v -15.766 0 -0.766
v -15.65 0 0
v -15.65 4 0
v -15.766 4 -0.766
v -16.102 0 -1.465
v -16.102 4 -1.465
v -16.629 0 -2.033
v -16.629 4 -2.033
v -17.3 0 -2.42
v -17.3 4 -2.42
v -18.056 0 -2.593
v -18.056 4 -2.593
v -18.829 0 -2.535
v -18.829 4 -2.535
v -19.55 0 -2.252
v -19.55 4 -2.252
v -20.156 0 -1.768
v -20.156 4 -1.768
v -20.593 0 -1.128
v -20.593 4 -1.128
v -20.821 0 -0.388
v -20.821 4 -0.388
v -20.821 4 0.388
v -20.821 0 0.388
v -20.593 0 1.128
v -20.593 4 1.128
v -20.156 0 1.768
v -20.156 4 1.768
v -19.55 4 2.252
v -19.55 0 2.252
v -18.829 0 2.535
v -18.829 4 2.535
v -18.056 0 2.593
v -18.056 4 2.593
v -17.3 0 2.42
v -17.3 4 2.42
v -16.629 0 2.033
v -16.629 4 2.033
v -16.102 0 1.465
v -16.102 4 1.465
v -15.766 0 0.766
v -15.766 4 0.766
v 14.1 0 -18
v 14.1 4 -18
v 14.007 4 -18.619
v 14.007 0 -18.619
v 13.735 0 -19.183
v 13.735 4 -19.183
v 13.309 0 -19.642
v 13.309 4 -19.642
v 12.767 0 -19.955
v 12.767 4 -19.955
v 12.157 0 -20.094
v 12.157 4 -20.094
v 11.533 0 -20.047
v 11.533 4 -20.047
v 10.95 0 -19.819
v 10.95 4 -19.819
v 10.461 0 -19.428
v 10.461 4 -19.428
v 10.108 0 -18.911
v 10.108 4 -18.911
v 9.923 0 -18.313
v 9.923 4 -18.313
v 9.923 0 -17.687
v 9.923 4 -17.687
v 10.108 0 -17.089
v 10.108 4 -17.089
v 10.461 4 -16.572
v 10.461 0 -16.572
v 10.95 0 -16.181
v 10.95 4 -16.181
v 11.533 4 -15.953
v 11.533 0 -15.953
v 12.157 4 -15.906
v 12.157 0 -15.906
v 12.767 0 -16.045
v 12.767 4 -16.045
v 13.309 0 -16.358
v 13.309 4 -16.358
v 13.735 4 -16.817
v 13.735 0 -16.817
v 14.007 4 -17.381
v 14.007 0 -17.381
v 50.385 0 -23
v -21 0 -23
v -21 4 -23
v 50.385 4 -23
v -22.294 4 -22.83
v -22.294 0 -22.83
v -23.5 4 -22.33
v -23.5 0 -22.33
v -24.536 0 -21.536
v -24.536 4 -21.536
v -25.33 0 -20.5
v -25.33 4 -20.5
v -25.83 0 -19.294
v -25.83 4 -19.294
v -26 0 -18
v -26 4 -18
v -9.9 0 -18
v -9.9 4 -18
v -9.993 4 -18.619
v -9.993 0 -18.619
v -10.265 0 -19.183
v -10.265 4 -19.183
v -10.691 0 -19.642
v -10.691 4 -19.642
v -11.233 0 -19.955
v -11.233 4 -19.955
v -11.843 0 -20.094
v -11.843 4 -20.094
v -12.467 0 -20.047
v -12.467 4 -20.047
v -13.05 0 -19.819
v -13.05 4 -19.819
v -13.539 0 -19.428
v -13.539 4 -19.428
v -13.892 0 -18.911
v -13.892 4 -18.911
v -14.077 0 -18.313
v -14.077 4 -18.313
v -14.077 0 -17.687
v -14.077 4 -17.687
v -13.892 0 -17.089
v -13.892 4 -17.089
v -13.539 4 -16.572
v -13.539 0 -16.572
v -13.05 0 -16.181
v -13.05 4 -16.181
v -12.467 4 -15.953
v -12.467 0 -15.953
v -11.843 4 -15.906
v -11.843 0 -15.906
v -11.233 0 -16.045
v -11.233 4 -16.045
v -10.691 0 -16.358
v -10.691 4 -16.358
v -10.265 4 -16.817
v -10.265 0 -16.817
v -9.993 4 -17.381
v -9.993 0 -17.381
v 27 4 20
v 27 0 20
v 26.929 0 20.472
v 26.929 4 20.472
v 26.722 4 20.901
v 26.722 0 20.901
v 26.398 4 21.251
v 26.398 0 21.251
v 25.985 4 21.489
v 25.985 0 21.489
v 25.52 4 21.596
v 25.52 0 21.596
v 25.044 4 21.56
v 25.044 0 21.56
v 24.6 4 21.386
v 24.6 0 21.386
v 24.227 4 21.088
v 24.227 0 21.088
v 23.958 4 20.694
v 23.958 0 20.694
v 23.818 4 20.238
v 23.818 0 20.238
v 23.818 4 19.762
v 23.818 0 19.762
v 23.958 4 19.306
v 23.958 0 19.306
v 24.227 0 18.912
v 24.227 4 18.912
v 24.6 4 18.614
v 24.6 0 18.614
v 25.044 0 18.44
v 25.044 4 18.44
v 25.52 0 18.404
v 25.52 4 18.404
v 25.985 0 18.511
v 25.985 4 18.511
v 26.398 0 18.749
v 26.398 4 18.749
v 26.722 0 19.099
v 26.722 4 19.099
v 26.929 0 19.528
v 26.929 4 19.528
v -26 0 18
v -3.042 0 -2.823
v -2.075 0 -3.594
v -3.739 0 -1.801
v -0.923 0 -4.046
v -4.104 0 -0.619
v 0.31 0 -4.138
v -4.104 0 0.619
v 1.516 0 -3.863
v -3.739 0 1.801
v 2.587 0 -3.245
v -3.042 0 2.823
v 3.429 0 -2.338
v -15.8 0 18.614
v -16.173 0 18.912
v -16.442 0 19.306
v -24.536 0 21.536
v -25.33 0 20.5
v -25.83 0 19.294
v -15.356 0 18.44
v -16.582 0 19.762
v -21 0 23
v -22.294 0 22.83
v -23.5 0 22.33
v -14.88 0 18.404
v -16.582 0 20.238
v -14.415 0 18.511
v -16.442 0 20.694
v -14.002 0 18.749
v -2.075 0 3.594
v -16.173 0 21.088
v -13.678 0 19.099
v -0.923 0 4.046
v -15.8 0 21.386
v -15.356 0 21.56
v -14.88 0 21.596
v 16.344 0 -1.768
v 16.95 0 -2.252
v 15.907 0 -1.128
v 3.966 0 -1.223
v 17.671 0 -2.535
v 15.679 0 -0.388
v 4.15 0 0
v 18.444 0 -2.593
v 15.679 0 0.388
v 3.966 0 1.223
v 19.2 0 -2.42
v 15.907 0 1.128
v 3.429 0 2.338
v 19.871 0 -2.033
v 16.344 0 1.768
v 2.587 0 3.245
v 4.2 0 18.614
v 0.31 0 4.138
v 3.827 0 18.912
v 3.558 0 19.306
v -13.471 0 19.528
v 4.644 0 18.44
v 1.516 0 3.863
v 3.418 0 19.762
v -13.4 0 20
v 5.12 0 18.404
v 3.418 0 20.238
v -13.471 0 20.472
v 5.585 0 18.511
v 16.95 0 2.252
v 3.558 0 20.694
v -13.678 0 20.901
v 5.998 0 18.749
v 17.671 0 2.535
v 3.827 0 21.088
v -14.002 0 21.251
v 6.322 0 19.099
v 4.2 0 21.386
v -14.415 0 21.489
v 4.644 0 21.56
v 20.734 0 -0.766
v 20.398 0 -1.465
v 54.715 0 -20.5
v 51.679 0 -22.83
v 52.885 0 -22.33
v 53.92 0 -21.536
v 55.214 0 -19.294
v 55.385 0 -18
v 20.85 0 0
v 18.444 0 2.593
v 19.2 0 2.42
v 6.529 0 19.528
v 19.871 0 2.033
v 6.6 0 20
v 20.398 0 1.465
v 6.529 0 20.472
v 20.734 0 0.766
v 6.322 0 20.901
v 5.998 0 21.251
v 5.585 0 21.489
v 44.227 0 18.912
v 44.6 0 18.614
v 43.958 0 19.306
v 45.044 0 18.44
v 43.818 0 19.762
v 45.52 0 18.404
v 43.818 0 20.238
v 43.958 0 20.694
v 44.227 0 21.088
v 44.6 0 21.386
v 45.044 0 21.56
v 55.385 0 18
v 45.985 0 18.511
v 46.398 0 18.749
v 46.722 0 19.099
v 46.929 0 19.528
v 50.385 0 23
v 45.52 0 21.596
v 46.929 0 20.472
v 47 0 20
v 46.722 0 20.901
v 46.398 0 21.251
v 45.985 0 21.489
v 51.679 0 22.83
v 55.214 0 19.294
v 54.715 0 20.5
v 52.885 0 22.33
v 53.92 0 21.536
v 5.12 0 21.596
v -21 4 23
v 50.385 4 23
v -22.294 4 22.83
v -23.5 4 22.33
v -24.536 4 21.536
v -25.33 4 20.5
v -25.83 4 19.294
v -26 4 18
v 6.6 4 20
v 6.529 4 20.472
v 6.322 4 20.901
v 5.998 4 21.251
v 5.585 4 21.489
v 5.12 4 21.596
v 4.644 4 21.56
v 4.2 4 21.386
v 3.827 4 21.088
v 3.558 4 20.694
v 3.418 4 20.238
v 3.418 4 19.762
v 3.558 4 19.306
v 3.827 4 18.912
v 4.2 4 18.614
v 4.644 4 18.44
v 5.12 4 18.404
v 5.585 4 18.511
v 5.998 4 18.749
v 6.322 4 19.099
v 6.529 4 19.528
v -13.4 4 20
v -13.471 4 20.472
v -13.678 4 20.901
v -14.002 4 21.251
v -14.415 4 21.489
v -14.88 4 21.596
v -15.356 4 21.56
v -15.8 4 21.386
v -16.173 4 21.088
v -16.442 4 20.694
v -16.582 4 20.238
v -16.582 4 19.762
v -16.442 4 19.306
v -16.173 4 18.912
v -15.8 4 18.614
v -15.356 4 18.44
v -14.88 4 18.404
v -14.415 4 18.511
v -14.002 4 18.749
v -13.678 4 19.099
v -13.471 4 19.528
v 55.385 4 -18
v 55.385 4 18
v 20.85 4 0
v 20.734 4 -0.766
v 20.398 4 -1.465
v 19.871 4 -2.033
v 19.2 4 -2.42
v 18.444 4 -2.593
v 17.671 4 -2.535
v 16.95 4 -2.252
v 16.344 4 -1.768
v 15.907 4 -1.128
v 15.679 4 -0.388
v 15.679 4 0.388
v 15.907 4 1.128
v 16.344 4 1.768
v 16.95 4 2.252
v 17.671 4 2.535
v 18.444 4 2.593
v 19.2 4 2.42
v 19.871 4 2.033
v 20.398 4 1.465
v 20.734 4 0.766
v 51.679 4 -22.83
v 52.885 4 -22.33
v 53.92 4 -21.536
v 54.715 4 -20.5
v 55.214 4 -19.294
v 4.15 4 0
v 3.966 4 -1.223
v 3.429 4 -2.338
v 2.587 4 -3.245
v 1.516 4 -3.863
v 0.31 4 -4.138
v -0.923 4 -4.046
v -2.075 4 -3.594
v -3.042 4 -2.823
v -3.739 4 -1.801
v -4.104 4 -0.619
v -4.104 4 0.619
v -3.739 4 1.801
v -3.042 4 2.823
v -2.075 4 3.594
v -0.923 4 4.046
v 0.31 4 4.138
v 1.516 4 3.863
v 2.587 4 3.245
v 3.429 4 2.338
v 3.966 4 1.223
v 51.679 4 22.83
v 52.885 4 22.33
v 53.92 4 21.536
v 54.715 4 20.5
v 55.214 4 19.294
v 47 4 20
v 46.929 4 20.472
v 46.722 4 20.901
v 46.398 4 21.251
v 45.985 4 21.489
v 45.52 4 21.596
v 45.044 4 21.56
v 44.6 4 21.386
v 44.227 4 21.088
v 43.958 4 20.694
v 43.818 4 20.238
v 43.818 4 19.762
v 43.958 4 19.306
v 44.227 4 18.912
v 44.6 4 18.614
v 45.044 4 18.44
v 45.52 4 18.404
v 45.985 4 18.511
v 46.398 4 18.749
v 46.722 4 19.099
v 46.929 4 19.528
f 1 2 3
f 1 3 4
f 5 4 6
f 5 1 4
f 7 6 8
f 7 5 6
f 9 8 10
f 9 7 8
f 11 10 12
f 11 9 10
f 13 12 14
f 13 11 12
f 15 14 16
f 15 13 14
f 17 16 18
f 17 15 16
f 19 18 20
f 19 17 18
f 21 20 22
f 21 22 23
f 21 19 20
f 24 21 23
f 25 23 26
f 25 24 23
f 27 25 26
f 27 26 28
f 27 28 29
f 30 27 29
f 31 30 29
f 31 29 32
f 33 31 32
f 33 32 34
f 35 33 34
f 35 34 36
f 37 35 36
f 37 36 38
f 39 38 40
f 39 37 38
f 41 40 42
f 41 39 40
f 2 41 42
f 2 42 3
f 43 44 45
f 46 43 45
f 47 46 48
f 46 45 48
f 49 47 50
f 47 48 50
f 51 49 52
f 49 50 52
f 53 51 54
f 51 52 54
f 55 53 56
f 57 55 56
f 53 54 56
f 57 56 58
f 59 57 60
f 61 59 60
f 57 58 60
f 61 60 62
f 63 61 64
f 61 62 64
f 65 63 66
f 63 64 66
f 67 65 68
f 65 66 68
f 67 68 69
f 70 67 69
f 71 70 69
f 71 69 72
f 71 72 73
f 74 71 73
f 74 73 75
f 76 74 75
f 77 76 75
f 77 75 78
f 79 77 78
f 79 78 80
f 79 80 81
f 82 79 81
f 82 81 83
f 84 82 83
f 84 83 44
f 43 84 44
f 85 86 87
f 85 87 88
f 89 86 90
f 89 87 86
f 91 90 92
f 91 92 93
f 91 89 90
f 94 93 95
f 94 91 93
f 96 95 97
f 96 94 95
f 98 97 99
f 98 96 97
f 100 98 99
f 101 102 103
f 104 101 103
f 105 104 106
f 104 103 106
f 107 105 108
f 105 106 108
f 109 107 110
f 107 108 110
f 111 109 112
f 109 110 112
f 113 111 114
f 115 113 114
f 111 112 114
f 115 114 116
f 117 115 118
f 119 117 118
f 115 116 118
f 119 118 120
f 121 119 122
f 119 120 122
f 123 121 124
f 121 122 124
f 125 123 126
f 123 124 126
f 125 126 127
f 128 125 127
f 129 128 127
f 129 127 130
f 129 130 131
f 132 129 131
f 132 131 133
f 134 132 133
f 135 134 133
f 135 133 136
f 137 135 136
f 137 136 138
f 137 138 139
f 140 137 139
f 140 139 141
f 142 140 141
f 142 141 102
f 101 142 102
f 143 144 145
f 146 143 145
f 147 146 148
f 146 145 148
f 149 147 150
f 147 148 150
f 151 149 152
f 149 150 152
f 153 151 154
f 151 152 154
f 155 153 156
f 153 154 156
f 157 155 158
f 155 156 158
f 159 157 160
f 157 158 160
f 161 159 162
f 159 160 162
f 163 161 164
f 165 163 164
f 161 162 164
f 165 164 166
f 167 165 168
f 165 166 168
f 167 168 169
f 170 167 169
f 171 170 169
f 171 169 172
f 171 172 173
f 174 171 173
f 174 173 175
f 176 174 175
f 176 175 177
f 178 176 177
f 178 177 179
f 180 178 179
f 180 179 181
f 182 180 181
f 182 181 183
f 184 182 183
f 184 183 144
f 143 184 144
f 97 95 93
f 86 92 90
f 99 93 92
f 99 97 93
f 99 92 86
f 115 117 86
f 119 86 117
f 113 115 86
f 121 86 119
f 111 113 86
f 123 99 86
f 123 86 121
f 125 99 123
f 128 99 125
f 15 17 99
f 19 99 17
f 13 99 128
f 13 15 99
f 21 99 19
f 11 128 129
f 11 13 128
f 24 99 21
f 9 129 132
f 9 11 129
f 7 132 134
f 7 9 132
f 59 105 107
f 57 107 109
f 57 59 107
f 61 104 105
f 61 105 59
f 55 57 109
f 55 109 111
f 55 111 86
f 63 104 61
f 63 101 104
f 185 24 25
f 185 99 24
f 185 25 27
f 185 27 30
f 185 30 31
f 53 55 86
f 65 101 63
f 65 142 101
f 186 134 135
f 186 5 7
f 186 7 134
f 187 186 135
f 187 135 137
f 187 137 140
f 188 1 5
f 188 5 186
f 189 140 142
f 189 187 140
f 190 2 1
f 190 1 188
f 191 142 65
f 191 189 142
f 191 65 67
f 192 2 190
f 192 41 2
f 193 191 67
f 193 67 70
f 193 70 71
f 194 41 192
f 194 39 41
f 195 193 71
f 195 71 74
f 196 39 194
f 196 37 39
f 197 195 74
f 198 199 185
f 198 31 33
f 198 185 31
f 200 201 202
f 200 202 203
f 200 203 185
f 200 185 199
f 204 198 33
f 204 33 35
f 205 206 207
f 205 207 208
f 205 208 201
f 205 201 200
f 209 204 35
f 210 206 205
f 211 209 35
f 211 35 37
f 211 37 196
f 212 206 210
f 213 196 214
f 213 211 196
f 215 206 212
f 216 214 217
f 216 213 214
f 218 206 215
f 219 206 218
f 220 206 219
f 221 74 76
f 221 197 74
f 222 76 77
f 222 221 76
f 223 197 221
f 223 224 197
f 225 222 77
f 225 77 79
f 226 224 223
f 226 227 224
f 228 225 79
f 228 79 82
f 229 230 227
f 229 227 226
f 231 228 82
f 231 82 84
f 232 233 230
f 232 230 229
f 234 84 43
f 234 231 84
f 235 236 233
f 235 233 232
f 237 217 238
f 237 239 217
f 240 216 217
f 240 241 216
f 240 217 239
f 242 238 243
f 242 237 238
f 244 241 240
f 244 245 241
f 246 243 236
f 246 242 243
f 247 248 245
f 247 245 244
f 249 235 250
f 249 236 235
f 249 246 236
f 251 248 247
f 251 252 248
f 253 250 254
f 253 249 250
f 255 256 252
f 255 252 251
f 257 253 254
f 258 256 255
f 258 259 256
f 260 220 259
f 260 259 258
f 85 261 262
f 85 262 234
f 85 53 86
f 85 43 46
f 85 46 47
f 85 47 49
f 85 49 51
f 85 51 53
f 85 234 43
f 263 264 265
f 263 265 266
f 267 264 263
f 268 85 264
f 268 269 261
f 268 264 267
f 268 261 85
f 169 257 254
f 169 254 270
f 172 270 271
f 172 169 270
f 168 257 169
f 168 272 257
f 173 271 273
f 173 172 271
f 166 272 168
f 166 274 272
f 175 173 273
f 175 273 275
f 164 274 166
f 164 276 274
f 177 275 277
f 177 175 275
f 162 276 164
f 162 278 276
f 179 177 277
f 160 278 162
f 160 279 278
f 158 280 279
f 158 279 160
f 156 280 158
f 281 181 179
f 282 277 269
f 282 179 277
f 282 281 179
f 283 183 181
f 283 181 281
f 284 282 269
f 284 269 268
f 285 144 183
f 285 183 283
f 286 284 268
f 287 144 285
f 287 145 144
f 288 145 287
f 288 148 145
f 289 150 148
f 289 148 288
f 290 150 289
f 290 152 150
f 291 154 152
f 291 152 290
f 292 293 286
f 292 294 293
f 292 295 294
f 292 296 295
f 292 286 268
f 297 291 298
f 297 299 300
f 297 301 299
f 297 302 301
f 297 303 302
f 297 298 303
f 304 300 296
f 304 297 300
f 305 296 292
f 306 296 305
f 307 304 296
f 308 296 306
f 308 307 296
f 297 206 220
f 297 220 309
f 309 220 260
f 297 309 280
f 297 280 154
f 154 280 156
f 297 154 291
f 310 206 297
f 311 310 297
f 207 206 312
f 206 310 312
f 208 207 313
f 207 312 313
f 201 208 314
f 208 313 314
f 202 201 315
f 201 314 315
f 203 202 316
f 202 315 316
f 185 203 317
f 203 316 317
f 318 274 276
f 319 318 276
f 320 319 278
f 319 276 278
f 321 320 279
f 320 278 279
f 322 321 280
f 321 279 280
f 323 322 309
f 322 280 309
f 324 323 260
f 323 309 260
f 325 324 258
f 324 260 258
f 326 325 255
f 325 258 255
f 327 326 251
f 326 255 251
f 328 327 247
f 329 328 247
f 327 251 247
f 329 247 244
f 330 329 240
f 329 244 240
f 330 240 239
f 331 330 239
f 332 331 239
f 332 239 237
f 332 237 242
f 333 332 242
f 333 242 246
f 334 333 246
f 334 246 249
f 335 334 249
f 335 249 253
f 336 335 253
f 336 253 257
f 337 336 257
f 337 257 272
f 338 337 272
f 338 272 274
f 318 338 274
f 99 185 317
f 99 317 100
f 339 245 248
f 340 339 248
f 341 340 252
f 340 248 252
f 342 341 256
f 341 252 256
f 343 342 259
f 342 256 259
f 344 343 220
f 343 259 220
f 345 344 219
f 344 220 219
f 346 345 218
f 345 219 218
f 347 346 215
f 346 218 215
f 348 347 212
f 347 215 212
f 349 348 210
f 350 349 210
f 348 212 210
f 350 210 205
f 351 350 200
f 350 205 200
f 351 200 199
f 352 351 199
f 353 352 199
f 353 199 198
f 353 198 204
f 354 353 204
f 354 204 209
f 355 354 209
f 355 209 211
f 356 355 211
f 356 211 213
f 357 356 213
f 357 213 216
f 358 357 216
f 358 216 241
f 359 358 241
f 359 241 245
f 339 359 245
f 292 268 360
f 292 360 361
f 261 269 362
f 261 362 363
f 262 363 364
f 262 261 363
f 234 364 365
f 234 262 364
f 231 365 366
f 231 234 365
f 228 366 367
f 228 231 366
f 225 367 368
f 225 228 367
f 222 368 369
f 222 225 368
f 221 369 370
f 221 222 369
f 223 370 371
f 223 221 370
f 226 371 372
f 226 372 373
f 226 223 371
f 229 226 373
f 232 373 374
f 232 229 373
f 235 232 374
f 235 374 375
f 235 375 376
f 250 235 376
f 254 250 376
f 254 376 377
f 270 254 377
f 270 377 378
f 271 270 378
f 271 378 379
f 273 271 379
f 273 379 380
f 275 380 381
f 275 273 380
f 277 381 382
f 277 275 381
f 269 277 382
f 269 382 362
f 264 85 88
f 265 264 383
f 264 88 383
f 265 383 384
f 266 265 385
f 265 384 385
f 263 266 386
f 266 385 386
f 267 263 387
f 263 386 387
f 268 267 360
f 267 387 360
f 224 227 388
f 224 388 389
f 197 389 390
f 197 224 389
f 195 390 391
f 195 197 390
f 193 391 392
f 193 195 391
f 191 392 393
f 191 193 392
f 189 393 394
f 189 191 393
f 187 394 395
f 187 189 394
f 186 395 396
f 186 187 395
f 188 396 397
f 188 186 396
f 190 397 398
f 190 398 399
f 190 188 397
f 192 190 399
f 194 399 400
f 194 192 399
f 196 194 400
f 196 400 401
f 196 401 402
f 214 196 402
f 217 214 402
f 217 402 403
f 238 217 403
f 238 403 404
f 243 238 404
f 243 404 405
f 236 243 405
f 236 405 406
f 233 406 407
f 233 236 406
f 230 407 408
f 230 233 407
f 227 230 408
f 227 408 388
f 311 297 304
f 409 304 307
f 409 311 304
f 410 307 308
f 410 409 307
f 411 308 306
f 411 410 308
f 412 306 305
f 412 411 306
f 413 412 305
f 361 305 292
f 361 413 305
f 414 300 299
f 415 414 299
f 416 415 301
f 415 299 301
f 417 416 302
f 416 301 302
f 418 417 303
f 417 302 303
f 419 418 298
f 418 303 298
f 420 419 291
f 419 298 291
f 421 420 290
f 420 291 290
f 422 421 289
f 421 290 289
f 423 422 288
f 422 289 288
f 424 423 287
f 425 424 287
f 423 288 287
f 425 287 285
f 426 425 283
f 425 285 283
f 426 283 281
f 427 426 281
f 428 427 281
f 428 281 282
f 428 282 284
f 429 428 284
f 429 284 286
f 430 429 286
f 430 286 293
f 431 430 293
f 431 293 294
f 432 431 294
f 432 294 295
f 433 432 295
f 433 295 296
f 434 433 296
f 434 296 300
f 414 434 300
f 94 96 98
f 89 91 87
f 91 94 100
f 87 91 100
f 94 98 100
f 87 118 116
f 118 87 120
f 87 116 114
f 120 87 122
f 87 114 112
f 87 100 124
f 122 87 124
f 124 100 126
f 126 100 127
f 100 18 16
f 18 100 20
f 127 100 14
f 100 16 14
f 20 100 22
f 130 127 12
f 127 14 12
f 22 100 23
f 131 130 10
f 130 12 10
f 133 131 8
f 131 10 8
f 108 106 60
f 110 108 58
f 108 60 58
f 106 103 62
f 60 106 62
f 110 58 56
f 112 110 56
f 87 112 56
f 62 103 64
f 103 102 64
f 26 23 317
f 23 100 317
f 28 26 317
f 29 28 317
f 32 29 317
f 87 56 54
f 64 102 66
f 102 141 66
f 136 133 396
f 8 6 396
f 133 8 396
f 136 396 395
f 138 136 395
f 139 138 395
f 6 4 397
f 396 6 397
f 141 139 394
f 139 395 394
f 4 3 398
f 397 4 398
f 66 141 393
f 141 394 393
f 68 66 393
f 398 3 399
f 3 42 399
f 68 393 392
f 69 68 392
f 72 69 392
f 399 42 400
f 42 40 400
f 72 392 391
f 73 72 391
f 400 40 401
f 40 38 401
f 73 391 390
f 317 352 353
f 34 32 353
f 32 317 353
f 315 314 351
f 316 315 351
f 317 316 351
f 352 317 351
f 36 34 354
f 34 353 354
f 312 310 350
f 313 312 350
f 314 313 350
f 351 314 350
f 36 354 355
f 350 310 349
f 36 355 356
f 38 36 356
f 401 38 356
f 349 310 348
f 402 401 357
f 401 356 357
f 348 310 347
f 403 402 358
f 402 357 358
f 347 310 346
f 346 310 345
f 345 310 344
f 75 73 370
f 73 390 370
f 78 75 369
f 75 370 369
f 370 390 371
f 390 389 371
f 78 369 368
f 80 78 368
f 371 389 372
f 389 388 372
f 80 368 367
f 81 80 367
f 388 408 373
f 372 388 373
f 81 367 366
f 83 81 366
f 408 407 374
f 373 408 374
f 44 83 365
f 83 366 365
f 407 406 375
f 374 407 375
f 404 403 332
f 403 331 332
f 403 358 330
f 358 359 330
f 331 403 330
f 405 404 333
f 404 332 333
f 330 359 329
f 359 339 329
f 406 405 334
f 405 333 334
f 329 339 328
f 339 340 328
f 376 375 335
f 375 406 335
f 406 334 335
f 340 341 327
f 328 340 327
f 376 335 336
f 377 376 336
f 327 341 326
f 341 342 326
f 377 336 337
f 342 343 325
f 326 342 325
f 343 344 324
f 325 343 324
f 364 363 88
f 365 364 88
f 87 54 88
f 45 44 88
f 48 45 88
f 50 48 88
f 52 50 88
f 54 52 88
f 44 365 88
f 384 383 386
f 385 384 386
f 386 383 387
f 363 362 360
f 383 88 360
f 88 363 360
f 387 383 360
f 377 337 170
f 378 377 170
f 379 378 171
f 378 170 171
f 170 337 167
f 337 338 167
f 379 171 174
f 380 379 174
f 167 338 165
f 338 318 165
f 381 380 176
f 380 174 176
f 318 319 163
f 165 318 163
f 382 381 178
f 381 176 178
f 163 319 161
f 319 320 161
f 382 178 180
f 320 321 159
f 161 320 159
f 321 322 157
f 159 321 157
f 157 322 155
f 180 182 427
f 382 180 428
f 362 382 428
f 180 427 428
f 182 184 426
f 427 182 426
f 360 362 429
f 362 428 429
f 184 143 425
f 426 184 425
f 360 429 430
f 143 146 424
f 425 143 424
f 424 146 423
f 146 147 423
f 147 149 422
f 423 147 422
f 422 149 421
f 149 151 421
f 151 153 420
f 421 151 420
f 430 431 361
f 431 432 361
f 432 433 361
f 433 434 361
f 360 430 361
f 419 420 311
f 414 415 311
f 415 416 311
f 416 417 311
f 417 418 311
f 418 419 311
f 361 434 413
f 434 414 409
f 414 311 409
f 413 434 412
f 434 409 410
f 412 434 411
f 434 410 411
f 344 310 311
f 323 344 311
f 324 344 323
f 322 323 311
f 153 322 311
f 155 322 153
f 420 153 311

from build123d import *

# Parameters (mm, degrees)
SKETCH_1_W            = 52
SKETCH_1_H            = 46
SKETCH_1_R            = 2.6
SKETCH_1_R_2          = 4.15
EXTRUDE_436_DEPTH     = 4
SKETCH_4_R            = 2.1
CUT_EXTRUDE_686_DEPTH = 5
SKETCH_6_R            = 2.1
EXTRUDE_1_DEPTH       = 4
SKETCH_7_R            = 1.2
CUT_EXTRUDE_1_DEPTH   = 5
SKETCH_8_W            = 29.384652785
SKETCH_8_H            = 46
EXTRUDE_2_DEPTH       = 4
FILLET_1_R            = 5
SKETCH_9_R            = 1.6
CUT_EXTRUDE_2_DEPTH   = 5


with BuildPart() as part:
    # 草图1 → Extrude 436 (new body)
    with BuildSketch(Plane(origin=(0, 0, 0), x_dir=(1, 0, 0), z_dir=(0, 1, 0))):
        Rectangle(SKETCH_1_W, SKETCH_1_H)
        with Locations((-18.25, 0)):
            Circle(SKETCH_1_R, mode=Mode.SUBTRACT)
        with Locations((18.25, 0)):
            Circle(SKETCH_1_R, mode=Mode.SUBTRACT)
        Circle(SKETCH_1_R_2, mode=Mode.SUBTRACT)
    extrude(amount=EXTRUDE_436_DEPTH)

    # 草图4 → Cut-Extrude 686 (cut, through all)
    with BuildSketch(Plane(origin=(0, 4, 0), x_dir=(1, 0, 0), z_dir=(0, 1, 0))):
        with Locations((-12, 18)):
            Circle(SKETCH_4_R)
        with Locations((12, 18)):
            Circle(SKETCH_4_R)
        with Locations((12, -18)):
            Circle(SKETCH_4_R)
        with Locations((-12, -18)):
            Circle(SKETCH_4_R)
    extrude(amount=-CUT_EXTRUDE_686_DEPTH, mode=Mode.SUBTRACT)

    # 草图6 → 凸台-拉伸1 (add)
    with BuildSketch(Plane(origin=(0, 4, 0), x_dir=(1, 0, 0), z_dir=(0, 1, 0))):
        with Locations((-12, -18)):
            Circle(SKETCH_6_R)
        with Locations((12, -18)):
            Circle(SKETCH_6_R)
    extrude(amount=-EXTRUDE_1_DEPTH)

    # 草图7 → 切除-拉伸1 (cut, through all)
    with BuildSketch(Plane(origin=(0, 4, 0), x_dir=(1, 0, 0), z_dir=(0, 1, 0))):
        with Locations((5, -20)):
            Circle(SKETCH_7_R)
        with Locations((-15, -20)):
            Circle(SKETCH_7_R)
    extrude(amount=-CUT_EXTRUDE_1_DEPTH, mode=Mode.SUBTRACT)

    # 草图8 → 凸台-拉伸2 (add)
    with BuildSketch(Plane.XZ):
        with Locations((40.692326393, 0)):
            Rectangle(SKETCH_8_W, SKETCH_8_H)
    extrude(amount=-EXTRUDE_2_DEPTH)

    # 圆角1
    fillet_1_edges = [part.edges().sort_by_distance(p)[0] for p in [
        (55.384652785, 2, 23),
        (55.384652785, 2, -23),
        (-26, 2, 23),
        (-26, 2, -23),
    ]]
    fillet(fillet_1_edges, radius=FILLET_1_R)

    # 草图9 → 切除-拉伸2 (cut, through all)
    with BuildSketch(Plane.XZ):
        with Locations((-15, 20)):
            Circle(SKETCH_9_R)
        with Locations((5, 20)):
            Circle(SKETCH_9_R)
        with Locations((25.4, 20)):
            Circle(SKETCH_9_R)
        with Locations((45.4, 20)):
            Circle(SKETCH_9_R)
    extrude(amount=-CUT_EXTRUDE_2_DEPTH, mode=Mode.SUBTRACT)


solid = part.part
